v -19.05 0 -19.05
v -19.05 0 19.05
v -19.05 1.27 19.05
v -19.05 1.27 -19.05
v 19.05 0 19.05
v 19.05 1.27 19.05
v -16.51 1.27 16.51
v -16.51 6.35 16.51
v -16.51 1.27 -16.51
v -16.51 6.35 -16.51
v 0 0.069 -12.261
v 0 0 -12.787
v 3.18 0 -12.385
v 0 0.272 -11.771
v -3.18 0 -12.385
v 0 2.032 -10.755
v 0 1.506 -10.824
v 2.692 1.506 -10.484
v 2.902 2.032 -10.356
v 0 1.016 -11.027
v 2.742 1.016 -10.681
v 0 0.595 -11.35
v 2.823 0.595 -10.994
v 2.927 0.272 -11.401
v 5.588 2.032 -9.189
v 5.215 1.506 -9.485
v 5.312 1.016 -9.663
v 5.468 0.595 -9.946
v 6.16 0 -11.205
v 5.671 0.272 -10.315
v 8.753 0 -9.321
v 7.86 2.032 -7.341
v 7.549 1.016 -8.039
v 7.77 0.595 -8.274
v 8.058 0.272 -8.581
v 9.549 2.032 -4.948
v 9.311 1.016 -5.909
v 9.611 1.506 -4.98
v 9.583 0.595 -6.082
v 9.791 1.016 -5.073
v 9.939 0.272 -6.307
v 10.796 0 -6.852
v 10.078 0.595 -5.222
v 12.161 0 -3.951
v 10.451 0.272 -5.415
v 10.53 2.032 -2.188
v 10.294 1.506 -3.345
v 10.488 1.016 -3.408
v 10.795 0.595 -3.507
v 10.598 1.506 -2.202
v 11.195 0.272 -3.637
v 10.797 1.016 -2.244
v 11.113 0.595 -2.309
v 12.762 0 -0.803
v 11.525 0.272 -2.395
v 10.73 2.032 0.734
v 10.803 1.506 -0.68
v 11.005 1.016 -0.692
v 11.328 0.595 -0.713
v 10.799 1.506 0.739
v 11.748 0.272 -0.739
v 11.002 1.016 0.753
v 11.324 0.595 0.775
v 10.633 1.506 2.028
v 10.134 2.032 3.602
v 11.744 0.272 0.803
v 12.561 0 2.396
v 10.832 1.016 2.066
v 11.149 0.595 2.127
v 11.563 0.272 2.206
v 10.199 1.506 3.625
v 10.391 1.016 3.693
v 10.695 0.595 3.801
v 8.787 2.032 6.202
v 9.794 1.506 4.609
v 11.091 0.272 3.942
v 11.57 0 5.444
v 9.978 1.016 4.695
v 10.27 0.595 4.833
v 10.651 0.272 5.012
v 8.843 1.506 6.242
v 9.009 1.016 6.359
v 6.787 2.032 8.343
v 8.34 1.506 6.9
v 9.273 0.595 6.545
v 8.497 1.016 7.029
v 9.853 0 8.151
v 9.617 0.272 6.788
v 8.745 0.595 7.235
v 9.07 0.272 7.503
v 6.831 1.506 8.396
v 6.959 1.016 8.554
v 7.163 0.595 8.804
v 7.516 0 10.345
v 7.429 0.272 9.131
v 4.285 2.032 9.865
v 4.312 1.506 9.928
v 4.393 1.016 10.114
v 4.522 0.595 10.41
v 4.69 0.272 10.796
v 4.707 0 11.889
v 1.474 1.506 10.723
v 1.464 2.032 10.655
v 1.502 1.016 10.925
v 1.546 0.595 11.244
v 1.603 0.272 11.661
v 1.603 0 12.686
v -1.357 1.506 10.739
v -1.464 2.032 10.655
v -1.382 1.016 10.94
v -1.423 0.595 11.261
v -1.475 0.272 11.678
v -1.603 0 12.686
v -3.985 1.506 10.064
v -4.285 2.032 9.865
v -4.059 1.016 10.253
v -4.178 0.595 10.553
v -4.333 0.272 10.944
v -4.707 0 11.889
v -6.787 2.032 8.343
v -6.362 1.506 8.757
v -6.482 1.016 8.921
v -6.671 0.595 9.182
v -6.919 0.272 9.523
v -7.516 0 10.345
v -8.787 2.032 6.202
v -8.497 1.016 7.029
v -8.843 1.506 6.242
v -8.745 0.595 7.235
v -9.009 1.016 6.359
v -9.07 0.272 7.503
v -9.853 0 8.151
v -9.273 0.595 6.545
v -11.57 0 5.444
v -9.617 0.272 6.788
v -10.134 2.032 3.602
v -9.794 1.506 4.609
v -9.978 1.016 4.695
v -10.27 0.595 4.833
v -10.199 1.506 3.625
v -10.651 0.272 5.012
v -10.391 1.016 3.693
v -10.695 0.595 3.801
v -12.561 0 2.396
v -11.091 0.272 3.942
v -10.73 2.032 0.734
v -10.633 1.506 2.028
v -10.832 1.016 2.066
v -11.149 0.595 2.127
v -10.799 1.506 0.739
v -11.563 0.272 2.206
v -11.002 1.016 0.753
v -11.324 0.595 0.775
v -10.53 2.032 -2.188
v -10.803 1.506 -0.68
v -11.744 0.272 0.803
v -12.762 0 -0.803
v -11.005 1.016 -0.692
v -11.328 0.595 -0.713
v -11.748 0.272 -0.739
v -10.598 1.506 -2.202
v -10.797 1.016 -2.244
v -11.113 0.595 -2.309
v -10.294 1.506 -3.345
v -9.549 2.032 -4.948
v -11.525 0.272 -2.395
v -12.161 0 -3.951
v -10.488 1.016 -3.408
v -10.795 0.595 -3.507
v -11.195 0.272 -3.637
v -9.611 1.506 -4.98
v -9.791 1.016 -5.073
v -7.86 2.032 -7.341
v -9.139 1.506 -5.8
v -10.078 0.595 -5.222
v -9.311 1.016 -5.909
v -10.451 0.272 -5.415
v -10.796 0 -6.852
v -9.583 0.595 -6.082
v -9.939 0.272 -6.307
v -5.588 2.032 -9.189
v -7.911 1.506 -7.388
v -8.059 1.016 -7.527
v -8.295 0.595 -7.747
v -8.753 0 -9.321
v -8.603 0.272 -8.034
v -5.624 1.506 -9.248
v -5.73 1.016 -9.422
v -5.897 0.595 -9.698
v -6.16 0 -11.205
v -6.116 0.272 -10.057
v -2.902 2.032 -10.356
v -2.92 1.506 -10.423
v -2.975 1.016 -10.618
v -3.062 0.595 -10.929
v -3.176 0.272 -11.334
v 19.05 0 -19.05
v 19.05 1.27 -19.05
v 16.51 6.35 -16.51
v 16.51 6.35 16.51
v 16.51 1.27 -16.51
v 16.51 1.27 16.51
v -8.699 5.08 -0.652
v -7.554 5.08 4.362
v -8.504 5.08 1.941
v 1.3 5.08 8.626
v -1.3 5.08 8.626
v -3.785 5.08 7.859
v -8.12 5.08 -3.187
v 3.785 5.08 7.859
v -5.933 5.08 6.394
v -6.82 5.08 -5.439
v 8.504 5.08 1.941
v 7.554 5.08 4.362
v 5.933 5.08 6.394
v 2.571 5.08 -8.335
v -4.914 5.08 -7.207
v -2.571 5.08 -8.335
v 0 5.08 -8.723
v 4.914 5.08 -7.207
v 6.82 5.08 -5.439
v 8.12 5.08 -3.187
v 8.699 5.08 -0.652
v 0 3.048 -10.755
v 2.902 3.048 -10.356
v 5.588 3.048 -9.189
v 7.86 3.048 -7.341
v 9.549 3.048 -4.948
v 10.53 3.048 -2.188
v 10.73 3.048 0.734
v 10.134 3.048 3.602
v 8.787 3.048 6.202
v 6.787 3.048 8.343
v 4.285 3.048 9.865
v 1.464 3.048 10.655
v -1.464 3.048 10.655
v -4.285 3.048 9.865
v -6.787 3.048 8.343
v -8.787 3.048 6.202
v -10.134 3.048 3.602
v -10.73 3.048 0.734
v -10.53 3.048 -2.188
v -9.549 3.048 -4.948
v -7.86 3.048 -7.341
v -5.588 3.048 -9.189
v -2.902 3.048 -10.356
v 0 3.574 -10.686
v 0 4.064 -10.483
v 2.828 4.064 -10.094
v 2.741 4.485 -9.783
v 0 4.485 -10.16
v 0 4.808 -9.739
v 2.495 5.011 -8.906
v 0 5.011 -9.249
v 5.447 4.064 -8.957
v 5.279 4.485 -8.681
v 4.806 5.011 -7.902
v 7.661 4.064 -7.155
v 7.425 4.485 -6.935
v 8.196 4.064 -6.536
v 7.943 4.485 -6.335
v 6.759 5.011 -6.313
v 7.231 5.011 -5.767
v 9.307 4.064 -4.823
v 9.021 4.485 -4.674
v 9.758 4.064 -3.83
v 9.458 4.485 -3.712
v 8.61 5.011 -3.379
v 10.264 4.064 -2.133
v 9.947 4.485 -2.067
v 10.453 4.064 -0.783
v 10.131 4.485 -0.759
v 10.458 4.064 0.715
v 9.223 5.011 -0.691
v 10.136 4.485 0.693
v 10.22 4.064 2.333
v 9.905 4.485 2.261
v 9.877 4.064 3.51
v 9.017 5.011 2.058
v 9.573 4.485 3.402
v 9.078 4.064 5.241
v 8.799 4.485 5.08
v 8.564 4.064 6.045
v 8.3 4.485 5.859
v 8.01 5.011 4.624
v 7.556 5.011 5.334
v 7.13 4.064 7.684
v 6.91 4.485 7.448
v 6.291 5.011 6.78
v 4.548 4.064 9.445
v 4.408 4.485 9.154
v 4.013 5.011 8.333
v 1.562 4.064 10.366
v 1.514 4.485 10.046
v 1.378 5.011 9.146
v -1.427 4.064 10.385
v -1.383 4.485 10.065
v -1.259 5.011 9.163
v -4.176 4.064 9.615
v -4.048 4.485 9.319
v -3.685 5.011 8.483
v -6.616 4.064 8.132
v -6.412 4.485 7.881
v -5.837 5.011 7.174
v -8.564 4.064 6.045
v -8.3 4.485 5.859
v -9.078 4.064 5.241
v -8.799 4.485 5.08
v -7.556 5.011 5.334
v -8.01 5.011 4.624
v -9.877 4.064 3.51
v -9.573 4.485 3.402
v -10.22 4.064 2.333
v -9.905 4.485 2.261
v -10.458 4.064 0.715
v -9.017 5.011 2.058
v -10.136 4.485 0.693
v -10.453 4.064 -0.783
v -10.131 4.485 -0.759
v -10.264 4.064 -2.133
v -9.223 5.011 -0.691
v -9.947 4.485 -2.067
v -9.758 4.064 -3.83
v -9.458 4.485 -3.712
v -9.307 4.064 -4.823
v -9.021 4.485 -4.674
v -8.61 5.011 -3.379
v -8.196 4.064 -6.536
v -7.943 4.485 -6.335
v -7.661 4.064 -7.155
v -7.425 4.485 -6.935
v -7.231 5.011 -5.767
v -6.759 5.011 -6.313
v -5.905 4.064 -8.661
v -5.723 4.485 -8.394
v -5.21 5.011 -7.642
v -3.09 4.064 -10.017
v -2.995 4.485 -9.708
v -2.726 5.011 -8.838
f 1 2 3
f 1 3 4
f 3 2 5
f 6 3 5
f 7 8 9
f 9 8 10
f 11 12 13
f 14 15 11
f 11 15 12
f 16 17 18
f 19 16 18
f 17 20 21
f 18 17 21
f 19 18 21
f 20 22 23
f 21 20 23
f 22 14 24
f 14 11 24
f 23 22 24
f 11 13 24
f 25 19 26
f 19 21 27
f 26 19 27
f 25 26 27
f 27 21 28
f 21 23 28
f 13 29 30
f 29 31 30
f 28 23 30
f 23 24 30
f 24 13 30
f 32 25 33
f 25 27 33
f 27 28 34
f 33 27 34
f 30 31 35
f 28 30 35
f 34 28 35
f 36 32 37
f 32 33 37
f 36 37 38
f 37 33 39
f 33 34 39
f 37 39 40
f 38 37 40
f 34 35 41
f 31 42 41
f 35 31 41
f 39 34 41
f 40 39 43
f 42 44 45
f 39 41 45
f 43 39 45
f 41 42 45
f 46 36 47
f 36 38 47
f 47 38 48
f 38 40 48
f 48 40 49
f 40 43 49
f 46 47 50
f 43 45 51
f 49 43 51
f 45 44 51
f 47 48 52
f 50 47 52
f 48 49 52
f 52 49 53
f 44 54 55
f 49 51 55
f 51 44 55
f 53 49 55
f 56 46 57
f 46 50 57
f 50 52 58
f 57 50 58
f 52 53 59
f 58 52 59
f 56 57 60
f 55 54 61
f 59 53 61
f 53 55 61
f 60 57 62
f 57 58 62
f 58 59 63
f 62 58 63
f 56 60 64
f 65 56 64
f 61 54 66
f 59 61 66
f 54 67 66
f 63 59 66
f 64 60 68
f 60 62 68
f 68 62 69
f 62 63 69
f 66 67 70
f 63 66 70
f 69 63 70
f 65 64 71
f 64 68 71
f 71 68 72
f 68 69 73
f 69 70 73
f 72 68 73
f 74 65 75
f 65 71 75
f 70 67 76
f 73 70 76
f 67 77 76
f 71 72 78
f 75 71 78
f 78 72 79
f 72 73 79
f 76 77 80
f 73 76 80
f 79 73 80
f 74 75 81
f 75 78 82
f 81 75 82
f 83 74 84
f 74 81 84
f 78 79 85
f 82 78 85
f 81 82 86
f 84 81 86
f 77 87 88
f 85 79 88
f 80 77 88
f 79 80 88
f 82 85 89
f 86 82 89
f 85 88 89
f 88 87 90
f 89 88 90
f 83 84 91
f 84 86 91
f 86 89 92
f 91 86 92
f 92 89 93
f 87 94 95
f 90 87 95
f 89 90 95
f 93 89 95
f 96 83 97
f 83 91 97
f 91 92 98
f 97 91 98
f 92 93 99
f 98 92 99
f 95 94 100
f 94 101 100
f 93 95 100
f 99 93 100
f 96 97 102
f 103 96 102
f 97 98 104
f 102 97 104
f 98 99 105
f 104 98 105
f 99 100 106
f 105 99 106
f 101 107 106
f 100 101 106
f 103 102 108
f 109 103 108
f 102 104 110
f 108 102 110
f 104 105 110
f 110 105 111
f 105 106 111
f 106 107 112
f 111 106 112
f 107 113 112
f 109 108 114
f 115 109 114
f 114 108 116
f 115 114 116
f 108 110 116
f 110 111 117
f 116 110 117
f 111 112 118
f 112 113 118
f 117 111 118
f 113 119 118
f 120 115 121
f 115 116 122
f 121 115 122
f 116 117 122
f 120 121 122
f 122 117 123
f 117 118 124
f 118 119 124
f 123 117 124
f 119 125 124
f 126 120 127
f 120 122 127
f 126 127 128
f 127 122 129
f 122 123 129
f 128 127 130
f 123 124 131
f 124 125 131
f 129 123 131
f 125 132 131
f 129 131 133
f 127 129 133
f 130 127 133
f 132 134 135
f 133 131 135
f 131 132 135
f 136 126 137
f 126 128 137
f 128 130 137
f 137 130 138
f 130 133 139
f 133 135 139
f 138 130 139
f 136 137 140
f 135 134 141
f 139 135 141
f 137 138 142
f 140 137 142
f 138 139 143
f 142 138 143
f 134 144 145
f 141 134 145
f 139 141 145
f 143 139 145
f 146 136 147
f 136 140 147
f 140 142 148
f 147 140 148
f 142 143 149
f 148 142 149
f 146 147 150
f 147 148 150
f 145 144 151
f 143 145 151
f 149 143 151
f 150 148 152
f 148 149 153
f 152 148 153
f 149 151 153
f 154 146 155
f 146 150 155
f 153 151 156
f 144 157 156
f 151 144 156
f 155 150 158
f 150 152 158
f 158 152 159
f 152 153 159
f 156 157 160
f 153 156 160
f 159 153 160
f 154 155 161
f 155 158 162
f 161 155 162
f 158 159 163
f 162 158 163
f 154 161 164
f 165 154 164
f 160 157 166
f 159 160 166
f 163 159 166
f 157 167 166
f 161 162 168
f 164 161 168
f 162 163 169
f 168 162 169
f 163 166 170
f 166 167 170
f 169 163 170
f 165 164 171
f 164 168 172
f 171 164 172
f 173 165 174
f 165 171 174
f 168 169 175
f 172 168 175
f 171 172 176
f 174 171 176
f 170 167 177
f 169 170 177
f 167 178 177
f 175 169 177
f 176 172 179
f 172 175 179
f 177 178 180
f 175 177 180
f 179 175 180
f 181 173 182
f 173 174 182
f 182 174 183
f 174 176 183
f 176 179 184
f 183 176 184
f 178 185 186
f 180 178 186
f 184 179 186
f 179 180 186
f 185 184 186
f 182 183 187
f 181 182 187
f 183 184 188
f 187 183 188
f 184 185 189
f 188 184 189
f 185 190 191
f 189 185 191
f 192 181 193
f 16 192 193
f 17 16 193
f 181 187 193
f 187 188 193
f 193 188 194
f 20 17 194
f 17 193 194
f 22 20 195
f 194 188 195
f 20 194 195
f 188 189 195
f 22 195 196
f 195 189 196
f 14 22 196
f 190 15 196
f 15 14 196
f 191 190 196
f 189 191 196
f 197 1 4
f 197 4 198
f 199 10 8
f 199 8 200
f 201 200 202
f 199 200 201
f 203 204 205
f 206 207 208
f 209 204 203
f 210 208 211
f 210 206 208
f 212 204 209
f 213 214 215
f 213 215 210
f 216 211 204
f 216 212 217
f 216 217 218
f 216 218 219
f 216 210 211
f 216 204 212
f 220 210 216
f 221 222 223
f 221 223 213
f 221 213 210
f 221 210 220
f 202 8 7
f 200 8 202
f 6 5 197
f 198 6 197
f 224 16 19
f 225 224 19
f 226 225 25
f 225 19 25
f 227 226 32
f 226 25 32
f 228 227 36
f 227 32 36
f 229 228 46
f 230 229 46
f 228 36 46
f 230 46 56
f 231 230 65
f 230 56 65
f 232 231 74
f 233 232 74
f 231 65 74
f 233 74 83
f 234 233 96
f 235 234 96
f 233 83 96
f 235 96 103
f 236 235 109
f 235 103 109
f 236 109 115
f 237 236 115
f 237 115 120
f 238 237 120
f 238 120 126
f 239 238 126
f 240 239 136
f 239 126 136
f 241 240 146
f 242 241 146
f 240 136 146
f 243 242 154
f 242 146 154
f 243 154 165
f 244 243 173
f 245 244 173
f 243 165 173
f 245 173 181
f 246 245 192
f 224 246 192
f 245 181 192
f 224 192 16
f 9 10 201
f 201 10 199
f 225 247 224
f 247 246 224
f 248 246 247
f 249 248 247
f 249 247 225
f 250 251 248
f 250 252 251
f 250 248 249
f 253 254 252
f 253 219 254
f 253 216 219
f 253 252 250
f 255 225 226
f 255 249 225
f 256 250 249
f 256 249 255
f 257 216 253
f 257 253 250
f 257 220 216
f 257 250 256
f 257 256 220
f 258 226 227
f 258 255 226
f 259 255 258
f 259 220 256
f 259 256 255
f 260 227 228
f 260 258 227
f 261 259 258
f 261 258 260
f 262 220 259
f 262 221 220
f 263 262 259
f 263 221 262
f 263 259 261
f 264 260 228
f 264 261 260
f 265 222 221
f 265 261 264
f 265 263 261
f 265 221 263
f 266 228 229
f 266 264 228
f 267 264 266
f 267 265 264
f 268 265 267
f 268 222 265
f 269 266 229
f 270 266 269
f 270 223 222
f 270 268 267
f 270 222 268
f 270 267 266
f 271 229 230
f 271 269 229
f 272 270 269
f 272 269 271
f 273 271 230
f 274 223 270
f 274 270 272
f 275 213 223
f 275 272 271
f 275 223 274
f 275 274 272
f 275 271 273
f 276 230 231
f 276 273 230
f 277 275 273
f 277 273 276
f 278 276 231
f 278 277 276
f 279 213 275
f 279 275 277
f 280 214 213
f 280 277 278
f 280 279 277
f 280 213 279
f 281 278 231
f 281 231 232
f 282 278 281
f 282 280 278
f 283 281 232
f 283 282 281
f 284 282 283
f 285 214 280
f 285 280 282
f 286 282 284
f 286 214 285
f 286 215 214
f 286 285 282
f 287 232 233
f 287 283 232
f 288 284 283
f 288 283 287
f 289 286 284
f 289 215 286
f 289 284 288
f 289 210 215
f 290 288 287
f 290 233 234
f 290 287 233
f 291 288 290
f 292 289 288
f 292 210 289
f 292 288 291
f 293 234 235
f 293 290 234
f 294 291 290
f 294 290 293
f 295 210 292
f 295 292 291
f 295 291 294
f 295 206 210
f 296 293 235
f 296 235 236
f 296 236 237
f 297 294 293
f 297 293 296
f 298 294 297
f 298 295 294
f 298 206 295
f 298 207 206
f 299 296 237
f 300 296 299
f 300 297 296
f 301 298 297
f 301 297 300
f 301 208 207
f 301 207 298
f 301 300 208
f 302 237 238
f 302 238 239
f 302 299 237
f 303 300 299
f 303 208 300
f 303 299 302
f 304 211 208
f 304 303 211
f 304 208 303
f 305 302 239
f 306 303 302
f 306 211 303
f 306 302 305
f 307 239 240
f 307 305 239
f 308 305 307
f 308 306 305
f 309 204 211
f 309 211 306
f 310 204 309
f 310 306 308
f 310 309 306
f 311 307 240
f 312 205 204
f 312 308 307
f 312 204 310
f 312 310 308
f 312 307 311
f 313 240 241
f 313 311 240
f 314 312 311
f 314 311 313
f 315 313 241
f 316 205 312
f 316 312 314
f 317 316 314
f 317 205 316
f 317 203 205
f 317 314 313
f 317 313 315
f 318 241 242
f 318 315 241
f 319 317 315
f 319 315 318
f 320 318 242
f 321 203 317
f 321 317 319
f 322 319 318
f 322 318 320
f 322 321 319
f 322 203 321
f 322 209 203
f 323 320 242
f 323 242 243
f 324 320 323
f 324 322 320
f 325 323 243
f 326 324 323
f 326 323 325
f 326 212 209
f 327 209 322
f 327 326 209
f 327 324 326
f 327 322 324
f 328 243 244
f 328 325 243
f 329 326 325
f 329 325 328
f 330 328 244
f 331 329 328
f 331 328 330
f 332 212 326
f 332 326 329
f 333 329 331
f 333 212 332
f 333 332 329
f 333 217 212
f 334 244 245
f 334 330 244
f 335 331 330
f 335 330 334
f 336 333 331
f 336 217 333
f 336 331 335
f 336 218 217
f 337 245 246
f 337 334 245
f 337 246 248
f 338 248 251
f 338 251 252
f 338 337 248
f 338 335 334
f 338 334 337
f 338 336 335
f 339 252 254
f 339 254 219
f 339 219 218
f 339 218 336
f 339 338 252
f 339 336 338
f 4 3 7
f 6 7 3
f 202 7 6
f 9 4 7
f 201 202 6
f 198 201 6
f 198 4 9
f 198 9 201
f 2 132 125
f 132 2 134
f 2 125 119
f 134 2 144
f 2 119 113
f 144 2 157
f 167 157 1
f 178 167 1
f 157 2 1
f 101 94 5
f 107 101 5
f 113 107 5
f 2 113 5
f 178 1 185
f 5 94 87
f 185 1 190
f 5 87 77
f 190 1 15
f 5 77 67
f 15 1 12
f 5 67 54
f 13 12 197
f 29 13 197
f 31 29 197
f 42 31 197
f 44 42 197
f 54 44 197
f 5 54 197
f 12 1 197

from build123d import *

# Parameters (mm, degrees)
SKETCH1_W           = 38.1
SKETCH1_H           = 38.1
BOSS_EXTRUDE1_DEPTH = 6.35
SKETCH2_W           = 33.02
SKETCH2_H           = 33.02
CUT_EXTRUDE1_DEPTH  = 5.08
SKETCH5_R           = 10.755
CUT_EXTRUDE5_DEPTH  = 5.08
FILLET7_R           = 2.032
FILLET8_R           = 2.032


with BuildPart() as part:
    # Sketch1 → Boss-Extrude1 (new body)
    with BuildSketch(Plane(origin=(0, 0, 0), x_dir=(1, 0, 0), z_dir=(0, 1, 0))):
        Rectangle(SKETCH1_W, SKETCH1_H)
    extrude(amount=BOSS_EXTRUDE1_DEPTH)

    # Sketch2 → Cut-Extrude1 (cut)
    with BuildSketch(Plane(origin=(0, 6.35, 0), x_dir=(1, 0, 0), z_dir=(0, 1, 0))):
        Polygon((-16.51, 19.05), (-19.05, 19.05), (-19.05, 16.51), (-19.05, -16.51), (-19.05, -19.05), (-16.51, -19.05), (16.51, -19.05), (19.05, -19.05), (19.05, -16.51), (19.05, 16.51), (19.05, 19.05), (16.51, 19.05), align=None)
        Rectangle(SKETCH2_W, SKETCH2_H, mode=Mode.SUBTRACT)
    extrude(amount=-CUT_EXTRUDE1_DEPTH, mode=Mode.SUBTRACT)

    # Sketch5 → Cut-Extrude5 (cut)
    with BuildSketch(Plane.XZ):
        with Locations(Location((0, 0, 0), (0, 0, 270))):
            Circle(SKETCH5_R)
    extrude(amount=-CUT_EXTRUDE5_DEPTH, mode=Mode.SUBTRACT)

    # Fillet7
    fillet7_edges = [part.edges().sort_by_distance(p)[0] for p in [
        (0, 5.08, 10.755),
    ]]
    fillet(fillet7_edges, radius=FILLET7_R)

    # Fillet8
    fillet8_edges = [part.edges().sort_by_distance(p)[0] for p in [
        (0, 0, 10.755),
    ]]
    fillet(fillet8_edges, radius=FILLET8_R)


solid = part.part
